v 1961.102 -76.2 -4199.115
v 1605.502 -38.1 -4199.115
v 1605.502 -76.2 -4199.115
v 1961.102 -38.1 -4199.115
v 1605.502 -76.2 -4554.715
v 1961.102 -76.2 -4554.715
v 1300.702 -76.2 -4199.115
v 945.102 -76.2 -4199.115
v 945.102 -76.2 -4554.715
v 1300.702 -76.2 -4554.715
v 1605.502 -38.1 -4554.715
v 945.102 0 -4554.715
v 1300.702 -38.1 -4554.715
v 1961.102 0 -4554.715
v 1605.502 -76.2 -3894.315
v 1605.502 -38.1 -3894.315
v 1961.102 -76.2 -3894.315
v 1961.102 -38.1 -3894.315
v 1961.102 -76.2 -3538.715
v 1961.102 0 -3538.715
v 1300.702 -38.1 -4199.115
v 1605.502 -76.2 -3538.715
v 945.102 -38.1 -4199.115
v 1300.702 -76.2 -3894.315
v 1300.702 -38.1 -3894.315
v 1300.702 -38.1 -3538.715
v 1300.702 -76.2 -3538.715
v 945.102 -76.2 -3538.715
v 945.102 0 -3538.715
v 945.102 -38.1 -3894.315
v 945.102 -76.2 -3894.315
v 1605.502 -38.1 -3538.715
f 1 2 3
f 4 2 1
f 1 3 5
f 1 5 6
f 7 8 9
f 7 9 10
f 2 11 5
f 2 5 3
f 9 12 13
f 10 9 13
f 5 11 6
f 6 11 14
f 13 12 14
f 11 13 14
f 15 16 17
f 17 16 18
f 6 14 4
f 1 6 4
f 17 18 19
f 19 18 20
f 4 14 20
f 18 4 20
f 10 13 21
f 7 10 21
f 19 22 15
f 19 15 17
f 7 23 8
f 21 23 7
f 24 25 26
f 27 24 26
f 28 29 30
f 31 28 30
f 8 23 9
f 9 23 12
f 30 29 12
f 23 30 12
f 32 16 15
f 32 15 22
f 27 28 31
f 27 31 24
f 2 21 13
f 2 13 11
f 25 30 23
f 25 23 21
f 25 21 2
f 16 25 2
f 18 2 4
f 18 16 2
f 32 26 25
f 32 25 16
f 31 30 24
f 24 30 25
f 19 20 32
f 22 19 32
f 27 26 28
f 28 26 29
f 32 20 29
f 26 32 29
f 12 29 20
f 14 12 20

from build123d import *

# Parameters (mm, degrees)
F0_W     = 355.6
F0_H     = 355.6
F1_DEPTH = 38.1
F2_DEPTH = 76.2


with BuildPart() as f1:
    # F0 (on Front) → F1 (new body)
    with BuildSketch(Plane.XZ):
        with Locations((1122.902123, -4376.915325)):
            Rectangle(F0_W, F0_H)
        Polygon((945.102123, -3894.315325), (945.102123, -4199.115325), (1300.702123, -4199.115325), (1300.702123, -4554.715325), (1605.502123, -4554.715325), (1605.502123, -4199.115325), (1961.102123, -4199.115325), (1961.102123, -3894.315325), (1605.502123, -3894.315325), (1605.502123, -3538.715325), (1300.702123, -3538.715325), (1300.702123, -3894.315325), align=None)
        with Locations((1783.302123, -4376.915325)):
            Rectangle(F0_W, F0_H)
        with Locations((1783.302123, -3716.515325)):
            Rectangle(F0_W, F0_H)
        with Locations((1122.902123, -3716.515325)):
            Rectangle(F0_W, F0_H)
    extrude(amount=F1_DEPTH)

    # F0 (on Front) → F2 (join)
    with BuildSketch(Plane.XZ):
        with Locations((1783.302123, -3716.515325)):
            Rectangle(F0_W, F0_H)
        with Locations((1783.302123, -4376.915325)):
            Rectangle(F0_W, F0_H)
        with Locations((1122.902123, -4376.915325)):
            Rectangle(F0_W, F0_H)
        with Locations((1122.902123, -3716.515325)):
            Rectangle(F0_W, F0_H)
    extrude(amount=F2_DEPTH)


solid = f1.part
